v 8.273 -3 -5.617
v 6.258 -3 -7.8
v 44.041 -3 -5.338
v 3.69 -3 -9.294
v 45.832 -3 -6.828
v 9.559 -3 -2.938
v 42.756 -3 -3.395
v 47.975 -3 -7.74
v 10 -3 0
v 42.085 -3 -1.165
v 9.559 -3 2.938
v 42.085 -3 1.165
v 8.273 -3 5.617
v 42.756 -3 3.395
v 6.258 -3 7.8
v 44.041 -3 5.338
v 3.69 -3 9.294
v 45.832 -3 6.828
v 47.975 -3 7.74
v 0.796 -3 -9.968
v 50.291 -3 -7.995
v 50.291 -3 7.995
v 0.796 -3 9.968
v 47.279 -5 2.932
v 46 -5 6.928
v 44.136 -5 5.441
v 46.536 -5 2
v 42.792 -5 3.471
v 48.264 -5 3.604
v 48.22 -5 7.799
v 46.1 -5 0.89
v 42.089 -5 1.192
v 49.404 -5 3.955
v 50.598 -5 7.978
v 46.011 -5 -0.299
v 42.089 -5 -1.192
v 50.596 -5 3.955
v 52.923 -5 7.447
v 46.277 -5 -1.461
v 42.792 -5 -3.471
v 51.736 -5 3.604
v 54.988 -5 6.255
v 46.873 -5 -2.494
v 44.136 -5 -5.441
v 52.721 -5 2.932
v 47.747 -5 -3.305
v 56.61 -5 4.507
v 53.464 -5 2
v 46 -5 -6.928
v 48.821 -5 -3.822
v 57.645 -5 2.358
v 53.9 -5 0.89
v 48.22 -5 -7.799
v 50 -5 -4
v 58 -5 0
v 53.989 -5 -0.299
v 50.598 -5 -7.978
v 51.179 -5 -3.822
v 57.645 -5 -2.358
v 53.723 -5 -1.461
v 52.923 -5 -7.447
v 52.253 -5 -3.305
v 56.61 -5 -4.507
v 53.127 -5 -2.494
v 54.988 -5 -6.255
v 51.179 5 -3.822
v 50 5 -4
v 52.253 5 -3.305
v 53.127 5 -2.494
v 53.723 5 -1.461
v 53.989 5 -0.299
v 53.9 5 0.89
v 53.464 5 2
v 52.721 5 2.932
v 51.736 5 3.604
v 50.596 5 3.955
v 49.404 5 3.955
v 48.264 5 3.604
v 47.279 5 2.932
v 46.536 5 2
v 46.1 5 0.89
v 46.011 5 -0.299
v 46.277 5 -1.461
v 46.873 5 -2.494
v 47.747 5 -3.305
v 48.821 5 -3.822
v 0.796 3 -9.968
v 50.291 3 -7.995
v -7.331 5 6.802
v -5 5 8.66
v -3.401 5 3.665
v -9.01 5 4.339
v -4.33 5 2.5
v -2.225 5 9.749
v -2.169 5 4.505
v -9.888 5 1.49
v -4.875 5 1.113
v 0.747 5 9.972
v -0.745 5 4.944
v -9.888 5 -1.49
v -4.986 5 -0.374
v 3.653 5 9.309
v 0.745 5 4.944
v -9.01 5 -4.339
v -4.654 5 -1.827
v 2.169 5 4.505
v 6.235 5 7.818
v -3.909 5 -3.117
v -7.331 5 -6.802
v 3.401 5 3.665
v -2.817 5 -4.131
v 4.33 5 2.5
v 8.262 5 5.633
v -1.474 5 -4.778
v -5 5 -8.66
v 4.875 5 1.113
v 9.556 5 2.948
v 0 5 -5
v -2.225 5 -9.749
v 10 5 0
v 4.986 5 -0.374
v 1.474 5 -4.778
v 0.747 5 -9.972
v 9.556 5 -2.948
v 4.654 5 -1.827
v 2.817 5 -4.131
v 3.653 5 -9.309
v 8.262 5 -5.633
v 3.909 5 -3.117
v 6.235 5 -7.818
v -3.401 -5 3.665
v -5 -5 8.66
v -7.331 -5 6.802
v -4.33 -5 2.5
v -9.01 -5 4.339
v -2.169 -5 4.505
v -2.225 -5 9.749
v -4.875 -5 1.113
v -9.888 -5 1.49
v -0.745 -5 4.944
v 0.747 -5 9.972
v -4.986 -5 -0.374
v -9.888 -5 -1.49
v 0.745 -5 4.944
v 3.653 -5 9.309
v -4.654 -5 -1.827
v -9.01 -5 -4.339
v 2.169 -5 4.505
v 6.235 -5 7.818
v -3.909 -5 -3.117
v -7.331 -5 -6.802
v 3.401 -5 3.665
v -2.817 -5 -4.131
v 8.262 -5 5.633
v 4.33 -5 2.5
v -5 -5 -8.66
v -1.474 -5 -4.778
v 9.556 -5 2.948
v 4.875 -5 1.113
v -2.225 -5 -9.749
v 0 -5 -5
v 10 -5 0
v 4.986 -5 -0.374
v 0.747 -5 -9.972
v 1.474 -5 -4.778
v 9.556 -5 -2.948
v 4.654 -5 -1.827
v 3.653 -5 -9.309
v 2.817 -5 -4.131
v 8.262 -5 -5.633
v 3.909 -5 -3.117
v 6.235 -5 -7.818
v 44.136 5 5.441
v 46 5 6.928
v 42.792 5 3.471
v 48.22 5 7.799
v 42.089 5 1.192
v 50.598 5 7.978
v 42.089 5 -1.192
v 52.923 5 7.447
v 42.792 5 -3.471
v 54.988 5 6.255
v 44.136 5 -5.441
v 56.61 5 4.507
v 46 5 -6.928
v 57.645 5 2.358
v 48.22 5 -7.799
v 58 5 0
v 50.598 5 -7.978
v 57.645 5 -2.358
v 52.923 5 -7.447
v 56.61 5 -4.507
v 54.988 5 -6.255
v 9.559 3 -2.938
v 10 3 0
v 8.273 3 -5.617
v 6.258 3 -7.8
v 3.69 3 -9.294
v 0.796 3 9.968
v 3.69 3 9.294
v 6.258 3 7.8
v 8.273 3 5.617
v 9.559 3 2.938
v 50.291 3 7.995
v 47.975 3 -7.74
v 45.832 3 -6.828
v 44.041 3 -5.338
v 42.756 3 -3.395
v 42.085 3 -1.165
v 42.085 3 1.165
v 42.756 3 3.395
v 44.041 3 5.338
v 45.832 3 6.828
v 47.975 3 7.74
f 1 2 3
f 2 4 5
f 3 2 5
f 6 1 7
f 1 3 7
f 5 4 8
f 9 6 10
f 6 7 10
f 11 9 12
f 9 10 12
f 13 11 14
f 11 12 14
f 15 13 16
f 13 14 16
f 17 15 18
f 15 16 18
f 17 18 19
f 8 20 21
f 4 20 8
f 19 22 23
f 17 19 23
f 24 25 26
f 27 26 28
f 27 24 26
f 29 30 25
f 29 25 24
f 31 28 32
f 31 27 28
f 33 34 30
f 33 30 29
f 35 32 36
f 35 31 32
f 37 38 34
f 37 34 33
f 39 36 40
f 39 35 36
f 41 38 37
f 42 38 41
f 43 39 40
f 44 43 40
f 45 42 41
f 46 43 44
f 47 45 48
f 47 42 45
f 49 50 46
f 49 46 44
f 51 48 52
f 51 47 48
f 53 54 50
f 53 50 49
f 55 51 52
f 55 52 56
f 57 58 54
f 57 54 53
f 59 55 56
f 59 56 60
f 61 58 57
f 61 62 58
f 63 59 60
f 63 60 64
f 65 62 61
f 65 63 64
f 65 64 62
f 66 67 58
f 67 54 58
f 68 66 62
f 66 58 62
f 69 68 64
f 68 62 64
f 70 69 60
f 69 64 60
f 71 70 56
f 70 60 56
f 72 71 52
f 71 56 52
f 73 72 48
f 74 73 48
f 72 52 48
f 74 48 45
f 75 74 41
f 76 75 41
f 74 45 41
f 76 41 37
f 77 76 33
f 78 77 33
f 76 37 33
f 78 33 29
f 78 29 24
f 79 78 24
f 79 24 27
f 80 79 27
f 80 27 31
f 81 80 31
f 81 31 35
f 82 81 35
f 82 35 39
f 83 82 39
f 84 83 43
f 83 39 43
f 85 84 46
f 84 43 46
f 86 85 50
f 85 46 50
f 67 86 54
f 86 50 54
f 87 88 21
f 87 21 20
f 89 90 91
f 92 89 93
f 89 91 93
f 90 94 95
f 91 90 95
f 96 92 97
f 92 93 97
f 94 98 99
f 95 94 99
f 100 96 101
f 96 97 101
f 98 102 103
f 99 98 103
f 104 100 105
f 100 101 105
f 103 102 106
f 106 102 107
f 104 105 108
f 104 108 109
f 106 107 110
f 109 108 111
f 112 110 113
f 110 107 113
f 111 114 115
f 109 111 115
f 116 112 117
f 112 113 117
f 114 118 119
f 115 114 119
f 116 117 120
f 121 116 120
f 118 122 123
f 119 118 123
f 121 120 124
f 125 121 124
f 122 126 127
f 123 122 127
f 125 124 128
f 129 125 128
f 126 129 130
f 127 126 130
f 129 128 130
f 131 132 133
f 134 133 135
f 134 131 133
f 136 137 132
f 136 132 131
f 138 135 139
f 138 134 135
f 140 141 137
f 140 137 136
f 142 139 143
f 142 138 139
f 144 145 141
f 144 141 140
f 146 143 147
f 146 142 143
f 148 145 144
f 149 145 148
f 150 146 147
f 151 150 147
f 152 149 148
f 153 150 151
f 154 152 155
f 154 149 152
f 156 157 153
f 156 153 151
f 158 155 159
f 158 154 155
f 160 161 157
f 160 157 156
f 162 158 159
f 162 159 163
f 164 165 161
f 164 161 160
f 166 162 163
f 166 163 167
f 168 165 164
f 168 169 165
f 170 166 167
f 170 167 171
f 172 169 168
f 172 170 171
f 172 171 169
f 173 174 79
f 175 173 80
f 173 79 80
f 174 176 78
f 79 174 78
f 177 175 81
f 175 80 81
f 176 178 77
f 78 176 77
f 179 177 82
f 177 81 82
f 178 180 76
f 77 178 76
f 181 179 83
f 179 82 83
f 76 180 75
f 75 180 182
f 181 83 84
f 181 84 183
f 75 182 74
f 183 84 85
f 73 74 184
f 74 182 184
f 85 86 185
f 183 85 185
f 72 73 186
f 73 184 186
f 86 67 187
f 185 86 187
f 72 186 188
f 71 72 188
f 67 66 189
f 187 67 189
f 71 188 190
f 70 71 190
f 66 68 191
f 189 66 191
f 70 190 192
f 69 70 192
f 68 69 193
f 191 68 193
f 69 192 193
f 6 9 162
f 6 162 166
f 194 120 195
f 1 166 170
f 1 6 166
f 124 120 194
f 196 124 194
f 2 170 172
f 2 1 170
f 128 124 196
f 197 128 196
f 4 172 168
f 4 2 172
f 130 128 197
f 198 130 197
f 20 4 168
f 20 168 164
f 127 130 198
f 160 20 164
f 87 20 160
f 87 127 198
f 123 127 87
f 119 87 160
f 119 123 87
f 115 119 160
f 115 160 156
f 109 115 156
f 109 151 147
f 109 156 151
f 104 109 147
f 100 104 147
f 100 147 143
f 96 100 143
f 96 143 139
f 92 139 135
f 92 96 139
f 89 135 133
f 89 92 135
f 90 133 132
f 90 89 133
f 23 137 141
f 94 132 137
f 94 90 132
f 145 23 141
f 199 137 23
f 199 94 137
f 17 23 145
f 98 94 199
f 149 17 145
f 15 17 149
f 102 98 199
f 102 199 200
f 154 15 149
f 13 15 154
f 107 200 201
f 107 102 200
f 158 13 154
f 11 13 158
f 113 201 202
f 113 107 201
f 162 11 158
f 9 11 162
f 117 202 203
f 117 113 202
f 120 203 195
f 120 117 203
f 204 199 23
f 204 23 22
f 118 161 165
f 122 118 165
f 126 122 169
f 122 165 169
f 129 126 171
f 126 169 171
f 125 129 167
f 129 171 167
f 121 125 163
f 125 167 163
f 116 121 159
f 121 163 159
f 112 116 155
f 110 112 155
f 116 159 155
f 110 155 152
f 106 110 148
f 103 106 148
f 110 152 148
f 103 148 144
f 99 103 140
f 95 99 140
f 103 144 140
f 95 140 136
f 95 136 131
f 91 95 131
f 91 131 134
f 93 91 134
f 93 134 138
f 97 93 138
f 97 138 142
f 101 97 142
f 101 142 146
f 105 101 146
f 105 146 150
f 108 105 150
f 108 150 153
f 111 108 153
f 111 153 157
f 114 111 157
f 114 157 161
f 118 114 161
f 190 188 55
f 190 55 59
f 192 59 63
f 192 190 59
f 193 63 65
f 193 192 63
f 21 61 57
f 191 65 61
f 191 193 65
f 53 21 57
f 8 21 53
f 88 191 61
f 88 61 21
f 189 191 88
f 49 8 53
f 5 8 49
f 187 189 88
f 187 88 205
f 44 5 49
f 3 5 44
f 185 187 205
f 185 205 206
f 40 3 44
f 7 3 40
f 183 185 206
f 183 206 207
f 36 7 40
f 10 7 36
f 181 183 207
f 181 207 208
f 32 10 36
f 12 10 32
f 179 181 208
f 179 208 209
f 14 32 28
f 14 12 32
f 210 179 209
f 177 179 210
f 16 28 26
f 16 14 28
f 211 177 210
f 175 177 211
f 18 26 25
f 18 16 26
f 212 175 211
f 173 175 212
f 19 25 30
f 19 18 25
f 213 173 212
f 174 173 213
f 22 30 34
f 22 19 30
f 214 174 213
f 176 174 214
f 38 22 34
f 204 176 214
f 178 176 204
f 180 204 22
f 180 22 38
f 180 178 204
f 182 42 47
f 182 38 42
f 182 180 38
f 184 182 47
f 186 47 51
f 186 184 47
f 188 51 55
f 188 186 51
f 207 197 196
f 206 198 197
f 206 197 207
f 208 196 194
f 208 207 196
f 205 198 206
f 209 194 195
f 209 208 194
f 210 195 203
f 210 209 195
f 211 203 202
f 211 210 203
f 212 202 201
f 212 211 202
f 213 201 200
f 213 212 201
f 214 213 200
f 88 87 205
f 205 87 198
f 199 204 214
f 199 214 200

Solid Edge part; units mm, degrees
sketch "Sketch1" plane through (0, 0, 0) normal (0, -1, 0) x (1, 0, 0)
  circle A0 centre (0, 0) radius 10
extrude "Protrusion1" add sketch "Sketch1" along normal mid plane 10
sketch "Sketch2" plane through (0, 0, 0) normal (0, -1, 0) x (1, 0, 0)
  circle A0 centre (50, 0) radius 8
extrude "Extrusionsausprägung_2" add sketch "Sketch2" along normal mid plane 10
sketch "Sketch3" plane through (0, 0, 0) normal (0, -1, 0) x (1, 0, 0)
  line L0 (0, 10) -> (50.3187, 7.9936)
  line L1 (50.3187, 7.9936) -> (50.3187, -7.9936)
  line L2 (50.3187, -7.9936) -> (0, -10)
  line L3 (0, -10) -> (0, 10)
extrude "Extrusionsausprägung_3" add sketch "Sketch3" along normal mid plane 6
hole "Bohrung_3" at (0, -5, 0) direction (0, 1, 0) diameter 10 end through all
hole "Bohrung_4" at (50, -5, 0) direction (0, 1, 0) diameter 8 end up to next
properties part number "H00" material "Verzinkter Stahl"
